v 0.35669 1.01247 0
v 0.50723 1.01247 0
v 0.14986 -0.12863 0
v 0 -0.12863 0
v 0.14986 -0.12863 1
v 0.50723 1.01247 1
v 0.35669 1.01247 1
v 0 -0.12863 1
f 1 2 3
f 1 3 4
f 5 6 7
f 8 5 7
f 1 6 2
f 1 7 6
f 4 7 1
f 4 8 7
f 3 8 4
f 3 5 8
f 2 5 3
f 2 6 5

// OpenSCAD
//------------------------------------------------------
// Mark
// Simple texte
// 5@xes 04/06/2022
//------------------------------------------------------

$fn=30;
// font = "Roboto:style=Bold";
// font = "Leelawadee:style=Bold";
font = "Gill Sans MT:style=Bold";

letter_height = 1;
letter_size =1;

render() translate([0,0,0]) letter("/");


module letter(Txt) {
  color("Red")
  linear_extrude(height = letter_height) {
    text(Txt, size = letter_size, font = font, halign = "left", valign = "baseline");
  }
}                
